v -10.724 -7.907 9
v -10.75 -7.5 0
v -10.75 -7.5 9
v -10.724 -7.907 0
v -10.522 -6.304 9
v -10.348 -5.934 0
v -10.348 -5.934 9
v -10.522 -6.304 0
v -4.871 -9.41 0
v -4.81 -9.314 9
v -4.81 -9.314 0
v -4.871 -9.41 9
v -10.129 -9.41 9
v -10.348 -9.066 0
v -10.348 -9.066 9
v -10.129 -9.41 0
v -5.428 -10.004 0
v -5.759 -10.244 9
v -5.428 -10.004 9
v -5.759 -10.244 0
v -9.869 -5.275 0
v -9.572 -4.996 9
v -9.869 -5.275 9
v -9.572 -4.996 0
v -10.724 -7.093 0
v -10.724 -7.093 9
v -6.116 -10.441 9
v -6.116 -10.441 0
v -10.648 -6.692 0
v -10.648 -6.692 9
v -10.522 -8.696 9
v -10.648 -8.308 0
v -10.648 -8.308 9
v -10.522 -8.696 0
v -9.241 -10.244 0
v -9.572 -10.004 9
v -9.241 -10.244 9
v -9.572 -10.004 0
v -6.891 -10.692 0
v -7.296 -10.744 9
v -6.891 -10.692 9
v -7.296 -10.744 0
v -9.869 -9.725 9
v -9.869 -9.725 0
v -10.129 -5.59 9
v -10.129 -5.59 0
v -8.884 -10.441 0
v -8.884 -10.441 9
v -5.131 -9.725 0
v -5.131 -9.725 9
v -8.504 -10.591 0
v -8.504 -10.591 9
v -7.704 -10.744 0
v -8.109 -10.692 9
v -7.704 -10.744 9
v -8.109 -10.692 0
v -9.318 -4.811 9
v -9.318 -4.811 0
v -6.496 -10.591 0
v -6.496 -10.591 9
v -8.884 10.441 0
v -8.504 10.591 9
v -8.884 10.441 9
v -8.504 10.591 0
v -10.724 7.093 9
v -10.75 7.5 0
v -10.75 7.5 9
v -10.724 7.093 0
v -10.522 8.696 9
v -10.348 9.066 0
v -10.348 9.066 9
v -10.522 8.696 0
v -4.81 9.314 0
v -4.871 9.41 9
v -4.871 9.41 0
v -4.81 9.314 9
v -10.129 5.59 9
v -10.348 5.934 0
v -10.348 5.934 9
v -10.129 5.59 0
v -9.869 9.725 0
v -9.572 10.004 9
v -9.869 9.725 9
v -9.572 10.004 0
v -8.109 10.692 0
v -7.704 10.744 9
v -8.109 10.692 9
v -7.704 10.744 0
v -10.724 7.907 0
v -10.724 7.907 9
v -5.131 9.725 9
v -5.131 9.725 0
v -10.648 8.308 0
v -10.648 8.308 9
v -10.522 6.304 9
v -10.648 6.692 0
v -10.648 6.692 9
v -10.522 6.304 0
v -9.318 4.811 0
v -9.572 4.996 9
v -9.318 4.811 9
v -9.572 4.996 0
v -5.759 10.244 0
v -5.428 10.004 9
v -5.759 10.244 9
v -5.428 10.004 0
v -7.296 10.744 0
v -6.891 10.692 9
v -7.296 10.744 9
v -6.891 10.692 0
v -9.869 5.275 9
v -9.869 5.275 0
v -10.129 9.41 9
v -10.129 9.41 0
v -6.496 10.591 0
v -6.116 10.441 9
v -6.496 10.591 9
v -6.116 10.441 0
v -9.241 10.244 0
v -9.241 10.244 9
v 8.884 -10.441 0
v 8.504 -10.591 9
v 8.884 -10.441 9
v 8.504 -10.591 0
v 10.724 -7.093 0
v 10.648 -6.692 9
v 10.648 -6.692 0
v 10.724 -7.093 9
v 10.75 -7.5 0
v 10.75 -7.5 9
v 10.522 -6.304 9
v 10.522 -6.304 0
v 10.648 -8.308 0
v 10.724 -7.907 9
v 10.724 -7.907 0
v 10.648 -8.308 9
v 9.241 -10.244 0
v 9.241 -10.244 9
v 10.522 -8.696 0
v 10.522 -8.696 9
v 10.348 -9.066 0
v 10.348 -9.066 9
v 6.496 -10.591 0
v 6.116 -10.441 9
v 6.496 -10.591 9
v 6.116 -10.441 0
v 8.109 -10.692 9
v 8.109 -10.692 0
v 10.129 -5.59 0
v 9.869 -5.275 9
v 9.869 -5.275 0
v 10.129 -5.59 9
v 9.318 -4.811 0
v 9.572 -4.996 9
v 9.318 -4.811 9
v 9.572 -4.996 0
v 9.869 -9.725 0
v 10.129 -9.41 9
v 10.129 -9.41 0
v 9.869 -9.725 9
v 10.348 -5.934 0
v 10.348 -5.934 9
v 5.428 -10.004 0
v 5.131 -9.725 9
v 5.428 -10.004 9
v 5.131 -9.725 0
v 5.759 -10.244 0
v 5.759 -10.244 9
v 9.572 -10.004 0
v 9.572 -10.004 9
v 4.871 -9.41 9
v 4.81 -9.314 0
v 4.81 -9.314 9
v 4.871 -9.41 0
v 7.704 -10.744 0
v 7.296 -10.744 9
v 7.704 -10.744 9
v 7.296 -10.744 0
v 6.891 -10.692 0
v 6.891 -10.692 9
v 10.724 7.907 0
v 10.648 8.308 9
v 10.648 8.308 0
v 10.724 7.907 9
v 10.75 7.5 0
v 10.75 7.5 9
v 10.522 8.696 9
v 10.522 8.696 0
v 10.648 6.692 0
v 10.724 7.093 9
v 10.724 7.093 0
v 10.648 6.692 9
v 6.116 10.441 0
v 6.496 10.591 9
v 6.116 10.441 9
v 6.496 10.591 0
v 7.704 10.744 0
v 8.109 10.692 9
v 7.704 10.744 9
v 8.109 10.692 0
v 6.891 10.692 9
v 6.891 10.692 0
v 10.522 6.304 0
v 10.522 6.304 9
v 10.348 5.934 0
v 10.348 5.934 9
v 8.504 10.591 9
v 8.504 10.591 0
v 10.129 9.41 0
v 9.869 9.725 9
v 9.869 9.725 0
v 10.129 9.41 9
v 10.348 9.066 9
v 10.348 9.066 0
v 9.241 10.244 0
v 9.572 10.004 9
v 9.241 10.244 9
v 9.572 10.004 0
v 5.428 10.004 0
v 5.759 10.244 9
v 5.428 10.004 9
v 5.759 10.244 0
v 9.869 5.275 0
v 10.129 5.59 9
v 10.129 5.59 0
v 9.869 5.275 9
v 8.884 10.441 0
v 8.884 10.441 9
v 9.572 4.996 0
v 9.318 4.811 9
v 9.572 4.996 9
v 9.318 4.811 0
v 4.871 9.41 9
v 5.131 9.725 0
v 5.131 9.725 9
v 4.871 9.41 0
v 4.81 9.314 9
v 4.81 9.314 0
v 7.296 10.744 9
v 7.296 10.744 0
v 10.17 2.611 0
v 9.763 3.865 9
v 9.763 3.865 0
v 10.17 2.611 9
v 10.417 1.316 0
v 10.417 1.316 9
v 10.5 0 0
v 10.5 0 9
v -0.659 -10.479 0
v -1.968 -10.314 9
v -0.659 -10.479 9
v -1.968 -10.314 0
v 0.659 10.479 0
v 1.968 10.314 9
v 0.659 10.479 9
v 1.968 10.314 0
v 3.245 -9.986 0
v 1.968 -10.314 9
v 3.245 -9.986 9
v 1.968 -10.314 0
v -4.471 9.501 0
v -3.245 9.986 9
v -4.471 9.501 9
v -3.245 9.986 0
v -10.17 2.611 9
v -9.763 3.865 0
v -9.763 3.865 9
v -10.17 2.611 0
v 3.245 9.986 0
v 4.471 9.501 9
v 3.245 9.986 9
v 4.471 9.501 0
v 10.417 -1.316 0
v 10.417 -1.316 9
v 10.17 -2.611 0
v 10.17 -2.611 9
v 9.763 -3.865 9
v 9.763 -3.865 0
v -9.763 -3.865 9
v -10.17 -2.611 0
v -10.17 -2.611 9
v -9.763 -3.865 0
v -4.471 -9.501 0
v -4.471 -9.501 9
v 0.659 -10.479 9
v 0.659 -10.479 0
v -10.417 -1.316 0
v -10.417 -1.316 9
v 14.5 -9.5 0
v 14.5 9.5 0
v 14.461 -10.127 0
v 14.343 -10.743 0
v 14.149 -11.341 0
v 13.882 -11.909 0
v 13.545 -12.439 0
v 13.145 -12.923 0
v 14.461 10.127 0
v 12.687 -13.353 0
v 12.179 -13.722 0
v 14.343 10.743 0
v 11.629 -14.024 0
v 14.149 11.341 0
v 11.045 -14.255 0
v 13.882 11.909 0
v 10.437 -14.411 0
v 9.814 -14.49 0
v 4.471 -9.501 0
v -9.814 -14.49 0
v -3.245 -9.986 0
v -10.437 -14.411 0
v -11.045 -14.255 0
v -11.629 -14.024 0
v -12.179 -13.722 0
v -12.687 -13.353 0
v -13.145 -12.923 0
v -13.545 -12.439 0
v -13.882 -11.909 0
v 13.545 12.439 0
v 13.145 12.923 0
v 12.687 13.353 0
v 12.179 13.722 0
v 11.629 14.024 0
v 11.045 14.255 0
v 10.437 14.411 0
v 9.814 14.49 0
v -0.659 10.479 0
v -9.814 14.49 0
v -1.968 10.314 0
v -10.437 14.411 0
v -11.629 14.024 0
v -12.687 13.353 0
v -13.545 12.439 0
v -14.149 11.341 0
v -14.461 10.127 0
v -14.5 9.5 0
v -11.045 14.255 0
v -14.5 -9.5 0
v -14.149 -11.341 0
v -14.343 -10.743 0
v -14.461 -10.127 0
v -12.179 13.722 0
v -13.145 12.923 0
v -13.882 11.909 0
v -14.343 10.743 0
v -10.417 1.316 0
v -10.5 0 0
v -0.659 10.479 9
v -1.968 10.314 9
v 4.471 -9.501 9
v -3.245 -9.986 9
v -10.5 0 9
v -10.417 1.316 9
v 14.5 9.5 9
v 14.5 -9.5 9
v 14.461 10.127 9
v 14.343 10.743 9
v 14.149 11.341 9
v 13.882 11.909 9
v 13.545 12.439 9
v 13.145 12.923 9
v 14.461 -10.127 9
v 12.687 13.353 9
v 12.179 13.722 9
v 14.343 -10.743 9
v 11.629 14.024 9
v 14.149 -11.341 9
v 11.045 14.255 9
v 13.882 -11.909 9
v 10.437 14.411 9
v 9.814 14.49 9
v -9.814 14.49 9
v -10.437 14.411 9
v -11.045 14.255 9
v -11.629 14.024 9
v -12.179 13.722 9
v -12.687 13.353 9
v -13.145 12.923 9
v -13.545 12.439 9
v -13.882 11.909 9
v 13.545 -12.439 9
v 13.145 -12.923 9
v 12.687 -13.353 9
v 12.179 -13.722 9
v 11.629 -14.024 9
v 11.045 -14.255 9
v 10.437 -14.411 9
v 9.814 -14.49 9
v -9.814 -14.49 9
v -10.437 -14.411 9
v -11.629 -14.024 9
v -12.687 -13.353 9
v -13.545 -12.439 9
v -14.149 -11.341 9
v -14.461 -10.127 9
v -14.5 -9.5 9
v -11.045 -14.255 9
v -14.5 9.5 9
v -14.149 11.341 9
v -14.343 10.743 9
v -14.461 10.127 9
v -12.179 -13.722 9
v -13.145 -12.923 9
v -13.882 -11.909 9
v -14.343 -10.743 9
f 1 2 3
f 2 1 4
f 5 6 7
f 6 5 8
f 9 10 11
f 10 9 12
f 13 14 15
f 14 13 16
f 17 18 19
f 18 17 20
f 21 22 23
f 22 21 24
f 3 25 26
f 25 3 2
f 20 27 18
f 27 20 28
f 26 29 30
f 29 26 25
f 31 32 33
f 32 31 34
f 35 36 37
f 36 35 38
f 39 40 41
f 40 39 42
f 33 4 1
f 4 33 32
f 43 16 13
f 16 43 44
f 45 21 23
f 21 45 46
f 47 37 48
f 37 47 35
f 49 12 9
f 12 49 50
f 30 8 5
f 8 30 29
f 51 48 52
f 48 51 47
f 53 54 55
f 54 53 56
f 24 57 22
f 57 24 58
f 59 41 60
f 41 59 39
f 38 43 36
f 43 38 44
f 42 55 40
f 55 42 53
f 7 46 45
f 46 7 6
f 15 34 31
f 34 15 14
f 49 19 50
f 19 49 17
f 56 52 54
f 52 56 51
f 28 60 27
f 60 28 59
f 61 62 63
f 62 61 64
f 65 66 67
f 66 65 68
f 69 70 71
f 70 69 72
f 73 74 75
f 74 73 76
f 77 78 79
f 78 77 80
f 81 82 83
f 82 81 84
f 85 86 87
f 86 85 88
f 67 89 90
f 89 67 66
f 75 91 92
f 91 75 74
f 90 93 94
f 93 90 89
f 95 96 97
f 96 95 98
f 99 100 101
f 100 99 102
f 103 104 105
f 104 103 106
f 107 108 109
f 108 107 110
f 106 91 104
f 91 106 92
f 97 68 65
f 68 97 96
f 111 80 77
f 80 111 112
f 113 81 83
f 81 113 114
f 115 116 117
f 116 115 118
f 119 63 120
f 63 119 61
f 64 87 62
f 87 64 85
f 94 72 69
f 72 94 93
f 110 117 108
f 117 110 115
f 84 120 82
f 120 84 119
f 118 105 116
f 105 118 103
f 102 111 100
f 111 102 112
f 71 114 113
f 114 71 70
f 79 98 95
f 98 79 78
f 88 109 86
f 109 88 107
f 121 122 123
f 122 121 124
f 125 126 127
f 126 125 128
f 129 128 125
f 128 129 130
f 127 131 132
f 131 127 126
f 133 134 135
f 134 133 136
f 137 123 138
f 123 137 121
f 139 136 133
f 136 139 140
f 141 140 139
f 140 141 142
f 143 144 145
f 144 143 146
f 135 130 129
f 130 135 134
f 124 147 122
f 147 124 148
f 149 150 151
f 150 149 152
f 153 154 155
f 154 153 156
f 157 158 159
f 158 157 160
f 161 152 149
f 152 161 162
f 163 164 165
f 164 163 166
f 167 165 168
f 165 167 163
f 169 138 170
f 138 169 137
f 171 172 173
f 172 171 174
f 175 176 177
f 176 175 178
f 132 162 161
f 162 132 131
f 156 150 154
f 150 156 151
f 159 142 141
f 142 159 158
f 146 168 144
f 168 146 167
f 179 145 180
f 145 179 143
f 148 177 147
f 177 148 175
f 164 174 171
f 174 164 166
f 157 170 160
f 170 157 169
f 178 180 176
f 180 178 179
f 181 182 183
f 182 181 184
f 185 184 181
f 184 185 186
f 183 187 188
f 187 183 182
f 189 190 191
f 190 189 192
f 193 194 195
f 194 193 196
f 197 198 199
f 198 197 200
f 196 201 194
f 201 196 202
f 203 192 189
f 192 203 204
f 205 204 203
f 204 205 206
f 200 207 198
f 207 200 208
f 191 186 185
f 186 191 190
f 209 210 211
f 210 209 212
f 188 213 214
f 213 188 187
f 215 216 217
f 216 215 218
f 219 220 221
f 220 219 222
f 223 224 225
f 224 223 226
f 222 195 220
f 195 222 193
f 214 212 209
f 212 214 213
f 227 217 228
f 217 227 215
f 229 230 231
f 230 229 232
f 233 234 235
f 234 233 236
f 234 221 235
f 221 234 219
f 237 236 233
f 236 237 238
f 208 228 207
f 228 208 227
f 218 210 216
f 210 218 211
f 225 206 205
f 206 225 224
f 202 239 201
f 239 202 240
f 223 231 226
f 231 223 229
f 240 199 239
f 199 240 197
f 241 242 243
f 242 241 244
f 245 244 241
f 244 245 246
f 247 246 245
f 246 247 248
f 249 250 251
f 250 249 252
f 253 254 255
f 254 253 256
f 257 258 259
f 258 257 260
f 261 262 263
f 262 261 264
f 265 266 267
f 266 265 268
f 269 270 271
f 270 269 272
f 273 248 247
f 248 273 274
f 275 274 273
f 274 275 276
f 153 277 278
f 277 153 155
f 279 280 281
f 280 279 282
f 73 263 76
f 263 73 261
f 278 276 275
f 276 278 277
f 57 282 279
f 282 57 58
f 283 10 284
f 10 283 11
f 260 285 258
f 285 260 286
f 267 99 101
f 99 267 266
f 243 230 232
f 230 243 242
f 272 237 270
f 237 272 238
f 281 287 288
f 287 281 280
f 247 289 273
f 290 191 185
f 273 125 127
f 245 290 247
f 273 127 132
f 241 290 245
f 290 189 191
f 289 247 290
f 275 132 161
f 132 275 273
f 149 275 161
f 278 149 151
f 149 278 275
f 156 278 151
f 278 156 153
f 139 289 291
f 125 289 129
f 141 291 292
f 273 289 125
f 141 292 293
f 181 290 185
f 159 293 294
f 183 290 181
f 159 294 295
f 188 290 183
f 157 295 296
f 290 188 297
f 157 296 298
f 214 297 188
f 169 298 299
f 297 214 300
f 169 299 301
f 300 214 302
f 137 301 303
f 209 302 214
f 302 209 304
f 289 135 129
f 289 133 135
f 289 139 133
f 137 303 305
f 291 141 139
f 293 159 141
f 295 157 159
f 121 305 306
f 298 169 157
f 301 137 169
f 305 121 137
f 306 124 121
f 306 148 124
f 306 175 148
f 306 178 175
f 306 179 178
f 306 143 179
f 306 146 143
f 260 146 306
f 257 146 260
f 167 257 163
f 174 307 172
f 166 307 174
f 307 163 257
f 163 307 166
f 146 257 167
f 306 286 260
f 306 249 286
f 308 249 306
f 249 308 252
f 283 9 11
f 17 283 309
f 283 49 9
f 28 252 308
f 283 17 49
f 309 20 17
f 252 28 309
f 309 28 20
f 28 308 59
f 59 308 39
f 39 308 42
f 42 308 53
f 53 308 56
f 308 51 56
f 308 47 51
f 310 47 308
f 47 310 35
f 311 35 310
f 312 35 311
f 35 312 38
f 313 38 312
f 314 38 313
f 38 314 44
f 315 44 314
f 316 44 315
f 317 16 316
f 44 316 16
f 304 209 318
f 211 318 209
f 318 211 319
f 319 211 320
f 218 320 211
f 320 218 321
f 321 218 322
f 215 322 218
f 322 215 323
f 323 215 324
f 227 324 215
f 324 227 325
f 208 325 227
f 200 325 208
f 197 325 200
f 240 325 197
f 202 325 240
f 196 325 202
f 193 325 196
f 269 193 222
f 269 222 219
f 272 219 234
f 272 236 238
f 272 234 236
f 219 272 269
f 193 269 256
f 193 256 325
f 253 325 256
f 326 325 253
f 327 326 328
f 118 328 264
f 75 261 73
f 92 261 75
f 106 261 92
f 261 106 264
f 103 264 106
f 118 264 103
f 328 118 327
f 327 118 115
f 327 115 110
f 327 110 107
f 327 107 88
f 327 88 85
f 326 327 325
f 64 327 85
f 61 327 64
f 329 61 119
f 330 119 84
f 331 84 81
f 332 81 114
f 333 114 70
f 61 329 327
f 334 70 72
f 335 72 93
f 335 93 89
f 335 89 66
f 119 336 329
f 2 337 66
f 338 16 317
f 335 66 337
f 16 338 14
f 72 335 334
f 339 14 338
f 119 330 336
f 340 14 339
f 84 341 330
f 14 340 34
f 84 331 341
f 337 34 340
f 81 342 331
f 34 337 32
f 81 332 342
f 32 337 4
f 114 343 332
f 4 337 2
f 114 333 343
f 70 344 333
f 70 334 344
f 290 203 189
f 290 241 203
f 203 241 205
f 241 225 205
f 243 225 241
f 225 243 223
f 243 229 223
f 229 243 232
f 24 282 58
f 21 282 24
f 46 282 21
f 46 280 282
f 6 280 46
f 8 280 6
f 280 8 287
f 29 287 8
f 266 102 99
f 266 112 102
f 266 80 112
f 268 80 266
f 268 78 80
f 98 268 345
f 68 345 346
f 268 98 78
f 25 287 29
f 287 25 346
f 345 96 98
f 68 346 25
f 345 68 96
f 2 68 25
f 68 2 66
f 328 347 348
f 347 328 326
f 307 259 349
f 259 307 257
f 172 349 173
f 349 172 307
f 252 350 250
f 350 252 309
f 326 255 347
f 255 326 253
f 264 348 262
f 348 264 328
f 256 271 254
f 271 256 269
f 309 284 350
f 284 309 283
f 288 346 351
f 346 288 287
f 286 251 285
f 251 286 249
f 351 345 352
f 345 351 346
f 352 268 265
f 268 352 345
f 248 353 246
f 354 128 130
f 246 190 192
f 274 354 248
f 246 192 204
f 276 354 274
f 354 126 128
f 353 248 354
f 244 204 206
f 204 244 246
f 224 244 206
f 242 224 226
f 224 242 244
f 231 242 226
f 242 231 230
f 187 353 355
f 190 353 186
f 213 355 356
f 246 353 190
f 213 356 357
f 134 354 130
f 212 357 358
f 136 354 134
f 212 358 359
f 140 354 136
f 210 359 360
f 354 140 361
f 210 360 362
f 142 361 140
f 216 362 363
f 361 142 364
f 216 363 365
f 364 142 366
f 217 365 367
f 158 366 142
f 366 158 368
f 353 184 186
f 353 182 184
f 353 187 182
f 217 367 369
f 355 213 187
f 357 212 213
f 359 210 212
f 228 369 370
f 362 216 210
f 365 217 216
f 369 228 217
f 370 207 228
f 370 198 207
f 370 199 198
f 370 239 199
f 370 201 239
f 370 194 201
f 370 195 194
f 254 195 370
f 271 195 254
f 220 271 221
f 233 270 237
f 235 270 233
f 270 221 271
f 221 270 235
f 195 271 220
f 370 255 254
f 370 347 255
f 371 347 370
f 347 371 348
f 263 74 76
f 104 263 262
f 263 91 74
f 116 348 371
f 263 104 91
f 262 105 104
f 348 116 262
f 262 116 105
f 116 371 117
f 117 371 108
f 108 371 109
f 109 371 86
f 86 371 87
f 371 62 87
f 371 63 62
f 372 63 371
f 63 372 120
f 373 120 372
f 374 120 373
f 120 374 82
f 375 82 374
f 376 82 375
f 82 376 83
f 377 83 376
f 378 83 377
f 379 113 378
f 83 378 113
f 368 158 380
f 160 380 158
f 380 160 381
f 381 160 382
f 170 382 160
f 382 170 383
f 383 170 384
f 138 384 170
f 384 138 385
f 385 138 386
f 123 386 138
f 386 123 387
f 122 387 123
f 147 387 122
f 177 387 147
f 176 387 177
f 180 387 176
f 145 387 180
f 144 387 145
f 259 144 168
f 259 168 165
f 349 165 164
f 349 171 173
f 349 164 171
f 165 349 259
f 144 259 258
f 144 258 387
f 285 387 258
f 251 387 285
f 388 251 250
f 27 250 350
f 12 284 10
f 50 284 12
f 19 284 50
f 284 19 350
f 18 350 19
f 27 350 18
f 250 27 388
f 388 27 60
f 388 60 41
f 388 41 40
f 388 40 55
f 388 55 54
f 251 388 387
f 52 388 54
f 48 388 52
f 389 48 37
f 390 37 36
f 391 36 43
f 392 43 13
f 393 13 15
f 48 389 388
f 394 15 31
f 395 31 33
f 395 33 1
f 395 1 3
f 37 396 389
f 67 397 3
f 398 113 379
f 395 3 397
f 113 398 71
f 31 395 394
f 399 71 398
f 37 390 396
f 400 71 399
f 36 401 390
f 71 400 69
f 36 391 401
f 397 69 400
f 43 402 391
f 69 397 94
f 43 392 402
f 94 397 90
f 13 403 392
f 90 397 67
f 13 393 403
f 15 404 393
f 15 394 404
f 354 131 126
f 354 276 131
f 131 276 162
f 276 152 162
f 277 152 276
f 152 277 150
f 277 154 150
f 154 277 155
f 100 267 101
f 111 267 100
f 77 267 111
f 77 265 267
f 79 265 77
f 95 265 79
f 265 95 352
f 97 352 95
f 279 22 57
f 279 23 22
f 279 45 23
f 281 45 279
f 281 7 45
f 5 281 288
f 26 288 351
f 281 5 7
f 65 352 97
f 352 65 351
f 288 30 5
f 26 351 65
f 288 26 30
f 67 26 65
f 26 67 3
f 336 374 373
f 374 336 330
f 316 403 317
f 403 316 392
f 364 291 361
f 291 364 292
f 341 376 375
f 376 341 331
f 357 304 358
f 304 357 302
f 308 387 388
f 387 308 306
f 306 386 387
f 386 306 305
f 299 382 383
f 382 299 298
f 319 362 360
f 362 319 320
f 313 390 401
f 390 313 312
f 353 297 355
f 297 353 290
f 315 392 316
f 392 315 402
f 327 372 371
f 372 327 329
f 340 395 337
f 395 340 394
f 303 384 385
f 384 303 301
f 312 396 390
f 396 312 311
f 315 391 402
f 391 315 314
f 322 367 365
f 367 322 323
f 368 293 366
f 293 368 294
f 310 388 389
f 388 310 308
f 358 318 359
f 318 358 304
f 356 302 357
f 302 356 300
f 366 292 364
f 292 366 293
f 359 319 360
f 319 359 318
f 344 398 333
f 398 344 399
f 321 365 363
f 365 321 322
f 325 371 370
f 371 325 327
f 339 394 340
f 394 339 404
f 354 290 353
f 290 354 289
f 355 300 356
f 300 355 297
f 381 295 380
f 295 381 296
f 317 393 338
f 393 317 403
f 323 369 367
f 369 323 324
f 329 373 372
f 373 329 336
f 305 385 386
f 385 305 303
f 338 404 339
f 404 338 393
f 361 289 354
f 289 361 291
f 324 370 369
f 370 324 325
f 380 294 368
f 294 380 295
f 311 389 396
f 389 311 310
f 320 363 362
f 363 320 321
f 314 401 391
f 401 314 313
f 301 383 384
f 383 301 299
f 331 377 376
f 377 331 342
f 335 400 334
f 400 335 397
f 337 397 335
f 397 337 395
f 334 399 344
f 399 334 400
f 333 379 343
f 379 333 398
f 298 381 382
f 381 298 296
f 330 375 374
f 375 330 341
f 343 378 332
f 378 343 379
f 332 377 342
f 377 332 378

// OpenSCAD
$fn = 50;

difference() {
	union() {
		hull() {
			translate(v = [-9.5, 9.5, 0]) {
				cylinder(h = 9, r = 5);
			}
			translate(v = [9.5, 9.5, 0]) {
				cylinder(h = 9, r = 5);
			}
			translate(v = [-9.5, -9.5, 0]) {
				cylinder(h = 9, r = 5);
			}
			translate(v = [9.5, -9.5, 0]) {
				cylinder(h = 9, r = 5);
			}
		}
	}
	union() {
		translate(v = [-7.5, -7.5, -100.0]) {
			cylinder(h = 200, r = 3.25);
		}
		translate(v = [-7.5, 7.5, -100.0]) {
			cylinder(h = 200, r = 3.25);
		}
		translate(v = [7.5, -7.5, -100.0]) {
			cylinder(h = 200, r = 3.25);
		}
		translate(v = [7.5, 7.5, -100.0]) {
			cylinder(h = 200, r = 3.25);
		}
		translate(v = [-7.5, -7.5, -100.0]) {
			cylinder(h = 200, r = 1.8);
		}
		translate(v = [-7.5, 7.5, -100.0]) {
			cylinder(h = 200, r = 1.8);
		}
		translate(v = [7.5, -7.5, -100.0]) {
			cylinder(h = 200, r = 1.8);
		}
		translate(v = [7.5, 7.5, -100.0]) {
			cylinder(h = 200, r = 1.8);
		}
		cylinder(h = 9, r = 10.5);
	}
}
